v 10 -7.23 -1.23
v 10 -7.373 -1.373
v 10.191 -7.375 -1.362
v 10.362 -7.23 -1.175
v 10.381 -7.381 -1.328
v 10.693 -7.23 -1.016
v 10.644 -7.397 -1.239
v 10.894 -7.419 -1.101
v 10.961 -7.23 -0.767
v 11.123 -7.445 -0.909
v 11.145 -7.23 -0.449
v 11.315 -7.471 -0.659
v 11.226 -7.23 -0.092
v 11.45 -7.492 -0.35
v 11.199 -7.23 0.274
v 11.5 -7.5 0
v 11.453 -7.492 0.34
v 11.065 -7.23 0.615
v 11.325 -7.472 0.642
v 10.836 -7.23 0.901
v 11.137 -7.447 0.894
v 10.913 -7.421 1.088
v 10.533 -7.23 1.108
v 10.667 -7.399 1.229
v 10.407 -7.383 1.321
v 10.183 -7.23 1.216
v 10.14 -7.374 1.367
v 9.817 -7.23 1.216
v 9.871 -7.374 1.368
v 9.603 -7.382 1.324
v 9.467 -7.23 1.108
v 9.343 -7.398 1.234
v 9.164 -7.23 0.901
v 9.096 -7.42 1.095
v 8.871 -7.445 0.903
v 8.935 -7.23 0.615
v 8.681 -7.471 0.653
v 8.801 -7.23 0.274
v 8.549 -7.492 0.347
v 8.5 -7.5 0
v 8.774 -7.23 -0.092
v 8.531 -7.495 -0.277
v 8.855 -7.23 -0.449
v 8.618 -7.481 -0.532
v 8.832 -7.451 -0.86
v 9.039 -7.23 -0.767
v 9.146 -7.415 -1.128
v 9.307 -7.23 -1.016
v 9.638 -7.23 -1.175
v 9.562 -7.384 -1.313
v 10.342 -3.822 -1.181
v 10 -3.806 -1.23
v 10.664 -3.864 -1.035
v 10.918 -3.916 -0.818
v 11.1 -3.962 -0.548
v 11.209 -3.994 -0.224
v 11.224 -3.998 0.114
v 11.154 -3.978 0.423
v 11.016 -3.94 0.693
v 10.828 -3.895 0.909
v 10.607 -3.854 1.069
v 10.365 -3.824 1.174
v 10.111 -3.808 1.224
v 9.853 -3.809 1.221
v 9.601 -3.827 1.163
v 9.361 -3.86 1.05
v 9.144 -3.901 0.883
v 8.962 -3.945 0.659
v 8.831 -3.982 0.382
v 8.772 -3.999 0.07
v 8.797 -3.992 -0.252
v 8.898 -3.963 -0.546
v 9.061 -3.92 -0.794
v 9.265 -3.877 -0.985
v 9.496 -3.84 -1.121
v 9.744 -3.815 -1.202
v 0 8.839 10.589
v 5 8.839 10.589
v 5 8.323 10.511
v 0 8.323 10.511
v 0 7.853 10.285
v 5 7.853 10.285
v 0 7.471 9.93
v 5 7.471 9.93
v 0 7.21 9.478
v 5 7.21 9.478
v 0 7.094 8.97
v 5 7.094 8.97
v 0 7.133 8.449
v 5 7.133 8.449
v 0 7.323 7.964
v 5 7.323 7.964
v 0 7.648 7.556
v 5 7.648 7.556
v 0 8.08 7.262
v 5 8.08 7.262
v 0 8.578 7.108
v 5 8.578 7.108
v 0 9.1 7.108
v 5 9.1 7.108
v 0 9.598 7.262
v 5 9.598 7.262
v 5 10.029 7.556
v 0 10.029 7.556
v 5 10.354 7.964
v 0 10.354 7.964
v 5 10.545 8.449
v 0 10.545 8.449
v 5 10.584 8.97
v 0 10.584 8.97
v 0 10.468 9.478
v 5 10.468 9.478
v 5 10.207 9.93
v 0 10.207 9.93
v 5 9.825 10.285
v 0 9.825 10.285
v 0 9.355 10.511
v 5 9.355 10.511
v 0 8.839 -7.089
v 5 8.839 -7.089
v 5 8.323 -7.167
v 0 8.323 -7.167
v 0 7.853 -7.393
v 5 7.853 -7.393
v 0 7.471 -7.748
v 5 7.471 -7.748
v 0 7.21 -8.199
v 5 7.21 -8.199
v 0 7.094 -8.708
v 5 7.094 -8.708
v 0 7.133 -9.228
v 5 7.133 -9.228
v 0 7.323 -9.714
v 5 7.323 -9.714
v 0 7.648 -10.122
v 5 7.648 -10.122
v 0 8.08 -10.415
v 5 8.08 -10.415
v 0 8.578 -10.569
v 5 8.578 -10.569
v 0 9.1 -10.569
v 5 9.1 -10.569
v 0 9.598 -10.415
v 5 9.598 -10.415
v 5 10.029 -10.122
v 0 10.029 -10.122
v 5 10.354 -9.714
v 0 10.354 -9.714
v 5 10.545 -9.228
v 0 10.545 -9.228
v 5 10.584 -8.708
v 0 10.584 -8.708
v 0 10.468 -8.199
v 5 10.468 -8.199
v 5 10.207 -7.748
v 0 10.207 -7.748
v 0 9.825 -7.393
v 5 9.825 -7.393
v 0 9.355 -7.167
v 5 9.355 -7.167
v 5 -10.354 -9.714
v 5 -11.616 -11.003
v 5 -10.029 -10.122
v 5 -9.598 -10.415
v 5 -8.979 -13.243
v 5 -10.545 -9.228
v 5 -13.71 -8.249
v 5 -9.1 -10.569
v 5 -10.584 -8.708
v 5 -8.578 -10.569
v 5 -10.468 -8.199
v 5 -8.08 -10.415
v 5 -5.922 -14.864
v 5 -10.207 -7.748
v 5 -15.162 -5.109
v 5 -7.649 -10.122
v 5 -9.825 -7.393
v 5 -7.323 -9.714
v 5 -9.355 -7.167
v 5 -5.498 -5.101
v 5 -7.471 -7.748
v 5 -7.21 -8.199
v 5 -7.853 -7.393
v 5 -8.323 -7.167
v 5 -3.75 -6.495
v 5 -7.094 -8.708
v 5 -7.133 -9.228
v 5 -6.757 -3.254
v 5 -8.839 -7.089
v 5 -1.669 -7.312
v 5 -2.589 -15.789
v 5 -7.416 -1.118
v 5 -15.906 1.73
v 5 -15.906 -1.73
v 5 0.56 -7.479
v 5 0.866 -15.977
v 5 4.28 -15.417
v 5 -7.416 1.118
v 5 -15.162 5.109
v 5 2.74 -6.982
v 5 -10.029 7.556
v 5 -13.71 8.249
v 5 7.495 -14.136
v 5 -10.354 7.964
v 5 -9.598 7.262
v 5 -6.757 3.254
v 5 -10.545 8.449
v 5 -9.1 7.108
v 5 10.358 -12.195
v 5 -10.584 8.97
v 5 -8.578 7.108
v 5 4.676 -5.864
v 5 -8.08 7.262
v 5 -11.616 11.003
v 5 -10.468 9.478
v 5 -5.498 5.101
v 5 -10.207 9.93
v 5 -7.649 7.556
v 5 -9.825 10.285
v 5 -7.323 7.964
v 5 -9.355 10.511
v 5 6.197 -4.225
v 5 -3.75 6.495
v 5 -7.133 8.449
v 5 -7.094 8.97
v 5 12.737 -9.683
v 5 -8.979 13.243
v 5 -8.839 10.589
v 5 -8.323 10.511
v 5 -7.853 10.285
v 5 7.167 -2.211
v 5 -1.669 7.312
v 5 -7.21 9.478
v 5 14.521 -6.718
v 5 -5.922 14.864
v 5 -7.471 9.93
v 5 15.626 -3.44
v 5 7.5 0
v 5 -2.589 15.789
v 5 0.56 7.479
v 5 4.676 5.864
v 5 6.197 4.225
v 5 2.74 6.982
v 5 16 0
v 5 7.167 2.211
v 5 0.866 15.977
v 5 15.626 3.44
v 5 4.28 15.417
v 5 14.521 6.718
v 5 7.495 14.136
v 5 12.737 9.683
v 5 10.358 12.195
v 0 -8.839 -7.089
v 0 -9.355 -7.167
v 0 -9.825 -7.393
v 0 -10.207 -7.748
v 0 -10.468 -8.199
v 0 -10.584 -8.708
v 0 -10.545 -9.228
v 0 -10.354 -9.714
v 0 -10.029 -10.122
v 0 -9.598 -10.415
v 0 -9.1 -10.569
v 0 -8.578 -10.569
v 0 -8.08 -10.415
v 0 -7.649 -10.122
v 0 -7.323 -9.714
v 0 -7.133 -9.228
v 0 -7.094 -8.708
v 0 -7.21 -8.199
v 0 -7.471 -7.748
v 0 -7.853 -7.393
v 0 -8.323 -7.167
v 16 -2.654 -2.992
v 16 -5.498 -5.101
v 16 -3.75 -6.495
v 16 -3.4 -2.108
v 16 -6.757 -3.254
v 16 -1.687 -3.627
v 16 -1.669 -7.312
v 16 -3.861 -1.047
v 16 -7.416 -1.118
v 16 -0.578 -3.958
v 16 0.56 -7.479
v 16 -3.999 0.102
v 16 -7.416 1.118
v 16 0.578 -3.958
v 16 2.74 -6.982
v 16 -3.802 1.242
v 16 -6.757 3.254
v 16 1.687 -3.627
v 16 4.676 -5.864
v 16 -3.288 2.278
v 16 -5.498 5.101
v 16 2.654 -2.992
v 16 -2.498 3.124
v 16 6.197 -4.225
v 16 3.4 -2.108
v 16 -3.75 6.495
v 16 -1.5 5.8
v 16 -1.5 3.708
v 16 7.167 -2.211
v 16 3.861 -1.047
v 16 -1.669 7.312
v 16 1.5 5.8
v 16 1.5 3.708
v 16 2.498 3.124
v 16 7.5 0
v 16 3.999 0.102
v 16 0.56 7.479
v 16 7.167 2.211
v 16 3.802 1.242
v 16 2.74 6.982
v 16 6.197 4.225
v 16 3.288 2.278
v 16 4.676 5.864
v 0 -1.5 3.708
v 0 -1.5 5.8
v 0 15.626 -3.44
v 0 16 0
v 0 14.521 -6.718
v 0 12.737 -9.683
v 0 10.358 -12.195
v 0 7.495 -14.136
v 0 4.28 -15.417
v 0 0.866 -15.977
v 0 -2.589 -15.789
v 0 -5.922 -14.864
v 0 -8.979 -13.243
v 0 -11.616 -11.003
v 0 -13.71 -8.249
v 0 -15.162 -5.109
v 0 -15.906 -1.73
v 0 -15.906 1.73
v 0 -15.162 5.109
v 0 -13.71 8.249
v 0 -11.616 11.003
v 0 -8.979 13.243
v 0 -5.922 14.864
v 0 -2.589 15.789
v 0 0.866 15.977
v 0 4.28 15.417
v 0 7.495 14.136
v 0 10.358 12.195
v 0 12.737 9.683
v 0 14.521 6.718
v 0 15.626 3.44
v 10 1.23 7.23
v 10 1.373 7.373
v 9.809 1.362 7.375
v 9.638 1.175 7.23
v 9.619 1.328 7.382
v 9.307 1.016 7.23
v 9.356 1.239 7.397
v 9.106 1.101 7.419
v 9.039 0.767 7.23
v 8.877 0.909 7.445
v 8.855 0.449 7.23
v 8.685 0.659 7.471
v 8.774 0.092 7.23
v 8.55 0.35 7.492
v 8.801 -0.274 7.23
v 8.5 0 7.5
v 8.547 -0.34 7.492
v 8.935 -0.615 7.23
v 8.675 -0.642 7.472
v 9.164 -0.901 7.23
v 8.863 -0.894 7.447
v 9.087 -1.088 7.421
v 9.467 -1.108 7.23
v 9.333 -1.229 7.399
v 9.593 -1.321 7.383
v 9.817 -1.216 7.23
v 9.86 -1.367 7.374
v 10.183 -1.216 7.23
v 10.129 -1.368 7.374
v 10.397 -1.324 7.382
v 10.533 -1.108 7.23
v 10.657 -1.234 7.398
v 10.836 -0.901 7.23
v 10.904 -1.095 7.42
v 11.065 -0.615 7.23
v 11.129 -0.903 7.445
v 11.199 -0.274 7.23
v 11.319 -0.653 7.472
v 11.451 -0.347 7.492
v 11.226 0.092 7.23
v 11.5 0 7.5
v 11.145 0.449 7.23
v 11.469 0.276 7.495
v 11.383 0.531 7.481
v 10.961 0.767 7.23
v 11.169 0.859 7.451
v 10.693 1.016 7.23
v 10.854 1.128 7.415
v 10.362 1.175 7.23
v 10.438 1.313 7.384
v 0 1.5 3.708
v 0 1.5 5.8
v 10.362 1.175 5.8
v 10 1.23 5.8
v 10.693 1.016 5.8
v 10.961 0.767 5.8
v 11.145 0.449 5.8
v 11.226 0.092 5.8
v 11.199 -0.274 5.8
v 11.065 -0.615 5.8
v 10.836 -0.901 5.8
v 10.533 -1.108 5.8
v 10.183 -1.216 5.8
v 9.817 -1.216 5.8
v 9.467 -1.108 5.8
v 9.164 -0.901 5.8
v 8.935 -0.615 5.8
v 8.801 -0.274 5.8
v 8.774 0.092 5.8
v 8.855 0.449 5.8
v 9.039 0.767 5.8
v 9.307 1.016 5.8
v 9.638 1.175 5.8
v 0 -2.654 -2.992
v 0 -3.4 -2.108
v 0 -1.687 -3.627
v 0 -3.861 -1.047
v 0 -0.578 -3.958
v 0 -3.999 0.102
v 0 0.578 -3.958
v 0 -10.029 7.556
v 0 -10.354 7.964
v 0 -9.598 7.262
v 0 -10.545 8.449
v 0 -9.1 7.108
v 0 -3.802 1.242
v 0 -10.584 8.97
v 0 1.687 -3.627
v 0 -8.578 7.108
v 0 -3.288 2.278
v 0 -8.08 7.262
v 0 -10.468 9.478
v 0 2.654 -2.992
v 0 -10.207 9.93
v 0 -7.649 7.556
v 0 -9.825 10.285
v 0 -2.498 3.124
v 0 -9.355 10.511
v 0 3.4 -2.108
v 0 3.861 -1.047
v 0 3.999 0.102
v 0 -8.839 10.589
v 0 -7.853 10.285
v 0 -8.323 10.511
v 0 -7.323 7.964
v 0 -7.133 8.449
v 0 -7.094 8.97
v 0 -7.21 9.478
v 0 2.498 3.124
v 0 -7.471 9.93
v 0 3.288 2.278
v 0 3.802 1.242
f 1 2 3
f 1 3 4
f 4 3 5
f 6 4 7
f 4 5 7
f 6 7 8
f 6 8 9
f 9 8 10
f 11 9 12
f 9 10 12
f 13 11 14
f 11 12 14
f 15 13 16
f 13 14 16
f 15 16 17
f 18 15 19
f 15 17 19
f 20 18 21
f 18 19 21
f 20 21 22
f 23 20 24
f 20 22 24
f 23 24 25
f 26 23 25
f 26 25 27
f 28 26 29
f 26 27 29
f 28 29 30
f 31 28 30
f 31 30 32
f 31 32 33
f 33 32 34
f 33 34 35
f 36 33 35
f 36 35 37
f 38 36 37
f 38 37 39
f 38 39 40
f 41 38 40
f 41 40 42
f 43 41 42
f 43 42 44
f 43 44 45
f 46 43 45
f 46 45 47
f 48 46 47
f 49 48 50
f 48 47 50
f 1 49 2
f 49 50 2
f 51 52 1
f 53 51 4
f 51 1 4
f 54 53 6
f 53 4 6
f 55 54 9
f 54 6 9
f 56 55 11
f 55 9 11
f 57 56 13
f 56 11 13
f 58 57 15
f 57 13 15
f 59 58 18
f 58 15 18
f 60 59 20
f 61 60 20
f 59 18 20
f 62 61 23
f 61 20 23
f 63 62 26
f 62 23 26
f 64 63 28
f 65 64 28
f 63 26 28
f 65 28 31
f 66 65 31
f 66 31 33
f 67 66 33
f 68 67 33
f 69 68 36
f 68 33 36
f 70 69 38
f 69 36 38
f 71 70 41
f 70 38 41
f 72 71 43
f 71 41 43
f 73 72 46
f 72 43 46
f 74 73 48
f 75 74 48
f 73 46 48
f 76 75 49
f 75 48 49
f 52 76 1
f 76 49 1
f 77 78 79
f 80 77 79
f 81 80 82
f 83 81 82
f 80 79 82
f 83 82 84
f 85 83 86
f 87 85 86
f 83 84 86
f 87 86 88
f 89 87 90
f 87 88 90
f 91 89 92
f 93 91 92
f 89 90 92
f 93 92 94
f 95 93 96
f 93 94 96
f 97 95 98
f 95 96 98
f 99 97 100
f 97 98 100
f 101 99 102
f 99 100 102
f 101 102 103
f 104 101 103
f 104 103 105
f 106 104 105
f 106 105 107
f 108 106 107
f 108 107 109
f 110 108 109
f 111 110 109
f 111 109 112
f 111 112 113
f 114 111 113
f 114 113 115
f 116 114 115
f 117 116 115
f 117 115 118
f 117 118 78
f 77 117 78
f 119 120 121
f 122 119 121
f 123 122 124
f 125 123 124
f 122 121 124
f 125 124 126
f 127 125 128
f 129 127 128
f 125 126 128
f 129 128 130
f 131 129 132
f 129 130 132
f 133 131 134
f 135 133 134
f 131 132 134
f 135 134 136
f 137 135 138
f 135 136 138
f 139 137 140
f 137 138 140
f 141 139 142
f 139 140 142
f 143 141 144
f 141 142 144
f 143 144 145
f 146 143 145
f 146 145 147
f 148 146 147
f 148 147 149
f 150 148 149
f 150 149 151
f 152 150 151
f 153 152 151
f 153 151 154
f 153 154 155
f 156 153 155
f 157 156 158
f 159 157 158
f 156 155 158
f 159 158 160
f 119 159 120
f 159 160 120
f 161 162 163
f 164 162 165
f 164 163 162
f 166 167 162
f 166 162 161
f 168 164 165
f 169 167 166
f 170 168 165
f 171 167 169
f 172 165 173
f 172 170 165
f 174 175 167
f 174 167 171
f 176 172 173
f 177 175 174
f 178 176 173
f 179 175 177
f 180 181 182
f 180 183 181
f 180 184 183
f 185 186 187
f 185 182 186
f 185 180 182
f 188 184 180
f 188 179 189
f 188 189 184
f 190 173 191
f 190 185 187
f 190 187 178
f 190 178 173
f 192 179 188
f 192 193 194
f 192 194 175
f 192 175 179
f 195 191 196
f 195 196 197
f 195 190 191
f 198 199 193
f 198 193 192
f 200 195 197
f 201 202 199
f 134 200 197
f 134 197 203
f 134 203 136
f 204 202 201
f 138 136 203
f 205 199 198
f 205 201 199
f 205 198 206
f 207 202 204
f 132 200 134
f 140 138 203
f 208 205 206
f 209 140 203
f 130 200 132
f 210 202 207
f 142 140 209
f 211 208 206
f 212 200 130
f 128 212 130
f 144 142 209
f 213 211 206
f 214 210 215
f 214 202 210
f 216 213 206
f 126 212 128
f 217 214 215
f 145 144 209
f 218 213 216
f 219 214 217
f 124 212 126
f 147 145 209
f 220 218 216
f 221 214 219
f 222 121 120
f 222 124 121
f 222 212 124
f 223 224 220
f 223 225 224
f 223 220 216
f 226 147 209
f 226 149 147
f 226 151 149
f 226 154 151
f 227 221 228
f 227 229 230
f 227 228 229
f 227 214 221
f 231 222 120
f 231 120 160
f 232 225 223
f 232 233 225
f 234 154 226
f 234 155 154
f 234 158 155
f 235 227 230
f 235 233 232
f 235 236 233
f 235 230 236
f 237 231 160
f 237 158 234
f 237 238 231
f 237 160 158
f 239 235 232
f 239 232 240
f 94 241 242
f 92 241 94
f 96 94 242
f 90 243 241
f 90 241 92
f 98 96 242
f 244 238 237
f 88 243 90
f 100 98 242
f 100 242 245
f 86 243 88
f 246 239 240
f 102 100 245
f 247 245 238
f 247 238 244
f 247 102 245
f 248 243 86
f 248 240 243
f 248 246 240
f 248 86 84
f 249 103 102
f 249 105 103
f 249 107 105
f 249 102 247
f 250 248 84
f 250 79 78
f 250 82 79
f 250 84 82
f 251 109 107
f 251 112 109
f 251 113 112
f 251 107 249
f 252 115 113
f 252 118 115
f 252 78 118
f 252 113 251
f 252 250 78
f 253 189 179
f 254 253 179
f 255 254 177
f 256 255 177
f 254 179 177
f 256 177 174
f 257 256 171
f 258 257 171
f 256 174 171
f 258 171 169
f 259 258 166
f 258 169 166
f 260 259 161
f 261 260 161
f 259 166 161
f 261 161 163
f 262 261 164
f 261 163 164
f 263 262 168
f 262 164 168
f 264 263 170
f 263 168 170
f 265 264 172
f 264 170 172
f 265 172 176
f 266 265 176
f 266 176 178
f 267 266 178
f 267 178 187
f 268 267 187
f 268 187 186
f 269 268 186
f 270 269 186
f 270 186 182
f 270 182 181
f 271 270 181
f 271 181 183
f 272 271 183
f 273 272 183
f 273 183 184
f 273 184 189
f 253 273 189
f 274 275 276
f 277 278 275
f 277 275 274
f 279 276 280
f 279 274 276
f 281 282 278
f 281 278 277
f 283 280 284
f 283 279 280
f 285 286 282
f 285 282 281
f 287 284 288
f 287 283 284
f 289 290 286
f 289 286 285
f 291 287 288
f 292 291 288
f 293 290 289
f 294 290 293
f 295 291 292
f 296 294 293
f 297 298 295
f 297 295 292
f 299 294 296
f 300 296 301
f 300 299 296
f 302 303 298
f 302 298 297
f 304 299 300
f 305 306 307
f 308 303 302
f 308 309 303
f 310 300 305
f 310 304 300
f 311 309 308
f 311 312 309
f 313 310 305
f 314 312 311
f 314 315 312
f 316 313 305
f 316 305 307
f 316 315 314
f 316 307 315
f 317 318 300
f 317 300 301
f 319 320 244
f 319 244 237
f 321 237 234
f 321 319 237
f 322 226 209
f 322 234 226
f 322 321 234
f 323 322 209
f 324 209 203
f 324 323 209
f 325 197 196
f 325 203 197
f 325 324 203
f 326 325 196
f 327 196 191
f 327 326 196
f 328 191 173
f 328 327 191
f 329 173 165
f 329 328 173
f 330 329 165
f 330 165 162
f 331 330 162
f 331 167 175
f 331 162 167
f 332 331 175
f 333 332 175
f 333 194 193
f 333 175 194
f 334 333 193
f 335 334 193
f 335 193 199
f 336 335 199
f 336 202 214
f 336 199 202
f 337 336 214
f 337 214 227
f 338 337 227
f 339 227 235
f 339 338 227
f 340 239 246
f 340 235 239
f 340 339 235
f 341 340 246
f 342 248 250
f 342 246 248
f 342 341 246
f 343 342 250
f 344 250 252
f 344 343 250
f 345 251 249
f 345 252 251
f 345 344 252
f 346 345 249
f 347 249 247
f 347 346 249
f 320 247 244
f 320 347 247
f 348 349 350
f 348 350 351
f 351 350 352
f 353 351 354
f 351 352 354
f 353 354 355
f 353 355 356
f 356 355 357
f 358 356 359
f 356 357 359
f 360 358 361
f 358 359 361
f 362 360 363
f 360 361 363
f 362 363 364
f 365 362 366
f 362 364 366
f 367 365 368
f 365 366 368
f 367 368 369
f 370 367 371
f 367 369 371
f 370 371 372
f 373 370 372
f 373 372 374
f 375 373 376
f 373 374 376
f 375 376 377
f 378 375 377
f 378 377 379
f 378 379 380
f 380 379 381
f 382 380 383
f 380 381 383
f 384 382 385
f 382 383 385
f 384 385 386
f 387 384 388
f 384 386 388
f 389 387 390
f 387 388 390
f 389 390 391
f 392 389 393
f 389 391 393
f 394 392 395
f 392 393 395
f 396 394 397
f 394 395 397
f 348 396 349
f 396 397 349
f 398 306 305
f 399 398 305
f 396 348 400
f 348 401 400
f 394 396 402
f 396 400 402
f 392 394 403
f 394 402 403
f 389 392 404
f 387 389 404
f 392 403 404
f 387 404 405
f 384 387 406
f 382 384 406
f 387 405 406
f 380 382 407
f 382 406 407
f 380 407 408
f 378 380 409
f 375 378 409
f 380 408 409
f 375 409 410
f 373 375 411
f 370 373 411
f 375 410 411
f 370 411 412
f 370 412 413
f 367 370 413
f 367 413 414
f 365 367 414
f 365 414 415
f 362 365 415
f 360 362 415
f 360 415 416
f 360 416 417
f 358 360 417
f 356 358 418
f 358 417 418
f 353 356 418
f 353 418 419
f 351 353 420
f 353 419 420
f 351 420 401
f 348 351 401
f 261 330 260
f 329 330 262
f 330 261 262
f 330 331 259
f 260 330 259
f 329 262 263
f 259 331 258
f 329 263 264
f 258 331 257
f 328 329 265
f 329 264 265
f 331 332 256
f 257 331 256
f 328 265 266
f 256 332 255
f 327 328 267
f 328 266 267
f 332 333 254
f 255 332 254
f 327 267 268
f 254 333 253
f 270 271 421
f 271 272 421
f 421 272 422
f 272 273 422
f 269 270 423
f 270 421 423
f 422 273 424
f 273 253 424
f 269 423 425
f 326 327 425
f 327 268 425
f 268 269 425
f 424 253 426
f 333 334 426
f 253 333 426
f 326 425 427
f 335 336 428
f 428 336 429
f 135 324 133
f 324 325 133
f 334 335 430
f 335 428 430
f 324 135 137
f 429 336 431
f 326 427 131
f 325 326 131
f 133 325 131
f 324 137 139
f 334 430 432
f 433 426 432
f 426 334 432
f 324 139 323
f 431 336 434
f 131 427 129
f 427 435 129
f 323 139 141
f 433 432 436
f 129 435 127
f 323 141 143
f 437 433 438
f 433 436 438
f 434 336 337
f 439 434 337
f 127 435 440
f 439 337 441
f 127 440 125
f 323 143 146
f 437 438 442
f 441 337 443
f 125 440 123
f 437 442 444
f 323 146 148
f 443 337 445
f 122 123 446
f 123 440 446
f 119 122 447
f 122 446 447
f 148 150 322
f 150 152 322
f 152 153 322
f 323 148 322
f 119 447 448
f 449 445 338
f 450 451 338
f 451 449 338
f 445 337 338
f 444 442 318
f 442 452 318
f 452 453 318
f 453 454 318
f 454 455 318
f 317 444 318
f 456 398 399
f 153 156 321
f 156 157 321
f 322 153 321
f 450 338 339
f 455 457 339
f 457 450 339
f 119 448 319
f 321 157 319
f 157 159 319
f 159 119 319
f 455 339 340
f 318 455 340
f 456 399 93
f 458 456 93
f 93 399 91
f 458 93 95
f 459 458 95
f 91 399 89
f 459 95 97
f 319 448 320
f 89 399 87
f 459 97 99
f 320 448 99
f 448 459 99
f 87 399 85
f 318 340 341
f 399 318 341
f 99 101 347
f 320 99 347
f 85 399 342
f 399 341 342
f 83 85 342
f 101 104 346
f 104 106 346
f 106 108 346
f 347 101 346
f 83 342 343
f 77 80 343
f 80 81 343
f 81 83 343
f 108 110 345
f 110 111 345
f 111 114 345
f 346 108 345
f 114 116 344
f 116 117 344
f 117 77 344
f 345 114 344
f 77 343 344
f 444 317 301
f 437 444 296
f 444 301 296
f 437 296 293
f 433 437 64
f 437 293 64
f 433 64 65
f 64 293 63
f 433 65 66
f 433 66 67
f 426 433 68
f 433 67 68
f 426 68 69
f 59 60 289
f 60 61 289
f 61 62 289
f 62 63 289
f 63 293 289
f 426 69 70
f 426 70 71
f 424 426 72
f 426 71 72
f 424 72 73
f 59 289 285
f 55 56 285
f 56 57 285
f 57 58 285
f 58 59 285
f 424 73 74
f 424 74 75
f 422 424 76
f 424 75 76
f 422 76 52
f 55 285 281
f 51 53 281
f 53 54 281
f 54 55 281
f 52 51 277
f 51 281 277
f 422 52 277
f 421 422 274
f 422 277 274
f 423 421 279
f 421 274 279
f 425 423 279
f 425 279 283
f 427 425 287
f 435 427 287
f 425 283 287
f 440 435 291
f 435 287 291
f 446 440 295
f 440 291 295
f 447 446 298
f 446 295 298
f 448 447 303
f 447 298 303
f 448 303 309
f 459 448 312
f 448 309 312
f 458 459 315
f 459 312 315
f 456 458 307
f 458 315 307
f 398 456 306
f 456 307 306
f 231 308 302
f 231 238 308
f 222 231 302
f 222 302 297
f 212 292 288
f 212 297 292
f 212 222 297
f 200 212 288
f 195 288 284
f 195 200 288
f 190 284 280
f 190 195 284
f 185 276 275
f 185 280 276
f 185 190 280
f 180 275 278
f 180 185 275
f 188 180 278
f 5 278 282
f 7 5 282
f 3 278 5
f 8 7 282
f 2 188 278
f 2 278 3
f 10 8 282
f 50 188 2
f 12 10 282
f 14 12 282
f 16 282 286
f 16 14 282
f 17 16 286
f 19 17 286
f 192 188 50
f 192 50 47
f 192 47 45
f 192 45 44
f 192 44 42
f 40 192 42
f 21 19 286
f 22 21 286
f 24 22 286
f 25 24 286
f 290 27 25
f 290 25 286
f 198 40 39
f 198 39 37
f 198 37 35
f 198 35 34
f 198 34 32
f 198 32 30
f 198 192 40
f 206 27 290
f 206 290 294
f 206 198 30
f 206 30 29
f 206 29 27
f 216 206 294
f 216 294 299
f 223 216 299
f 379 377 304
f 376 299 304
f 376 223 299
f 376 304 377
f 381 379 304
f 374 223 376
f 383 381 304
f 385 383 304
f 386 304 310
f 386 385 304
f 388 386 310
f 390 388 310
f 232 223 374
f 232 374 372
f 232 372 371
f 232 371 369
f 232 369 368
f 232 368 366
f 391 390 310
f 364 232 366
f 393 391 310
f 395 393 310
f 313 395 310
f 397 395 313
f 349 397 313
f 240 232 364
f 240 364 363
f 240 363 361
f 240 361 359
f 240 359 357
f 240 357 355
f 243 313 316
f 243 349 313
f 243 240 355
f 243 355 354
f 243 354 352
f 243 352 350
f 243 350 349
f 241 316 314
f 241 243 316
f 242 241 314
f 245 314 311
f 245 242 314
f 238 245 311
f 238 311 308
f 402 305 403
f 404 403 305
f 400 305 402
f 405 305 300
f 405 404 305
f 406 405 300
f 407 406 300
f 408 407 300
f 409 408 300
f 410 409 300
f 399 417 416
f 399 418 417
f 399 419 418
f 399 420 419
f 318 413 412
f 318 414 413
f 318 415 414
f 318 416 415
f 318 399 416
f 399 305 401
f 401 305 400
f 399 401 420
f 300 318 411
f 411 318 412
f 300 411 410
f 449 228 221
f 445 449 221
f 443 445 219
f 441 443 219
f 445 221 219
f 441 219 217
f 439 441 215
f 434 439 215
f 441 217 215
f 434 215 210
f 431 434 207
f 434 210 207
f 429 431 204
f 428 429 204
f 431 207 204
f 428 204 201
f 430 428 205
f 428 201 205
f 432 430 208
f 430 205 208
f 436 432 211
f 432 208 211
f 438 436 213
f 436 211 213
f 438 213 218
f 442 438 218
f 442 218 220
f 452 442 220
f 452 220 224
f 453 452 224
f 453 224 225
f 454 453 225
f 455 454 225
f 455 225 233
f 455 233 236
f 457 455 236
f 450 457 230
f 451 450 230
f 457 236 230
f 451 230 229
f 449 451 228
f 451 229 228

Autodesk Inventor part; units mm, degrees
sketch "Sketch_1" plane through (0, 0, 0) normal (0, 0, 1) x (1, 0, 0)
  line L0 (16, 0) -> (0, 0)
  line L1 (0, 4) -> (16, 4)
  line L2 (16, 4) -> (16, 7.5)
  line L3 (16, 7.5) -> (5, 7.5)
  line L4 (5, 7.5) -> (5, 16)
  line L5 (5, 16) -> (0, 16)
  line L6 (0, 16) -> (0, 4)
revolve "Revolution1" add sketch "Sketch_1" angle 360 about axis through (16, 0, 0) along (1, 0, 0)
sketch "Sketch2" plane through (0, 0, 0) normal (-1, 0, 0) x (0, 0, 1)
  point P0 (-8.8388, 8.8388)
hole "Hole1" at (0, 8.8388, -8.8388) direction (1, 0, 0) diameter 3.5 depth 5
pattern_linear "Rectangular Pattern1" count 2 spacing 17.6777 along (0, 0, 1) count 2 spacing 17.6777 along (0, -1, 0) of "Hole1"
sketch "Sketch_4" plane through (10, 0, 0) normal (1, 0, 0) x (0, 0, -1)
  line L0 (0, -7.5) -> (0, -3)
  line L1 (0, -3) -> (1.2295, -3)
  line L2 (1.2295, -3) -> (1.2295, -7.2295)
  line L3 (1.2295, -7.2295) -> (1.5, -7.5)
  line L4 (1.5, -7.5) -> (0, -7.5)
  line L5 (0, -7.5) -> (0, -3)
revolve "Revolution2" cut sketch "Sketch_4" angle 360 about axis through (10, -7.5, 0) along (0, -1, 0)
thread "Thread1" size "M3x0.5" class "6H" standard "ISO Metric profile" length 3.2295
sketch "Sketch_8" plane through (0, 0, 0) normal (1, 0, 0) x (0, 1, 0)
  line L0 (1.5, 5.8) -> (-1.5, 5.8)
  line L1 (-1.5, 5.8) -> (-1.5, 0)
  line L2 (-1.5, 0) -> (1.5, 0)
  line L3 (1.5, 0) -> (1.5, 5.8)
extrude "Extrusion1" cut sketch "Sketch_8" along normal blind 16
sketch "Sketch_5" plane through (10, 0, 0) normal (1, 0, 0) x (0, 0, -1)
  line L0 (-4, 0) -> (-7.5, 0)
  line L1 (-7.5, 0) -> (-7.5, 1.5)
  line L2 (-7.5, 1.5) -> (-7.2295, 1.2295)
  line L3 (-7.2295, 1.2295) -> (-4, 1.2295)
  line L4 (-4, 1.2295) -> (-4, 0)
  line L5 (-4, 0) -> (-7.5, 0)
revolve "Revolution3" cut sketch "Sketch_5" angle 360 about axis through (10, 0, 4) along (0, 0, -1)
thread "Thread2" size "M3x0.5" class "6H" standard "ISO Metric profile" length 1.4295
ref_plane "to_screw1_XY" through (10, 0, 5.8) normal (0, 0, 1) x (1, 0, 0)
ref_plane "to_screw1_YZ" through (10, 0, 5.8) normal (1, 0, 0) x (0, 1, 0)
ref_plane "to_screw1_ZX" through (10, 0, 5.8) normal (0, 1, 0) x (0, 0, 1)
ref_plane "to_screw2_XY" through (10, -4, 0) normal (0, -1, 0) x (1, 0, 0)
ref_plane "to_screw2_YZ" through (10, -4, 0) normal (1, 0, 0) x (0, 0, 1)
ref_plane "to_screw2_ZX" through (10, -4, 0) normal (0, 0, 1) x (0, -1, 0)
properties part number "STHRANG8-MB_ss"
